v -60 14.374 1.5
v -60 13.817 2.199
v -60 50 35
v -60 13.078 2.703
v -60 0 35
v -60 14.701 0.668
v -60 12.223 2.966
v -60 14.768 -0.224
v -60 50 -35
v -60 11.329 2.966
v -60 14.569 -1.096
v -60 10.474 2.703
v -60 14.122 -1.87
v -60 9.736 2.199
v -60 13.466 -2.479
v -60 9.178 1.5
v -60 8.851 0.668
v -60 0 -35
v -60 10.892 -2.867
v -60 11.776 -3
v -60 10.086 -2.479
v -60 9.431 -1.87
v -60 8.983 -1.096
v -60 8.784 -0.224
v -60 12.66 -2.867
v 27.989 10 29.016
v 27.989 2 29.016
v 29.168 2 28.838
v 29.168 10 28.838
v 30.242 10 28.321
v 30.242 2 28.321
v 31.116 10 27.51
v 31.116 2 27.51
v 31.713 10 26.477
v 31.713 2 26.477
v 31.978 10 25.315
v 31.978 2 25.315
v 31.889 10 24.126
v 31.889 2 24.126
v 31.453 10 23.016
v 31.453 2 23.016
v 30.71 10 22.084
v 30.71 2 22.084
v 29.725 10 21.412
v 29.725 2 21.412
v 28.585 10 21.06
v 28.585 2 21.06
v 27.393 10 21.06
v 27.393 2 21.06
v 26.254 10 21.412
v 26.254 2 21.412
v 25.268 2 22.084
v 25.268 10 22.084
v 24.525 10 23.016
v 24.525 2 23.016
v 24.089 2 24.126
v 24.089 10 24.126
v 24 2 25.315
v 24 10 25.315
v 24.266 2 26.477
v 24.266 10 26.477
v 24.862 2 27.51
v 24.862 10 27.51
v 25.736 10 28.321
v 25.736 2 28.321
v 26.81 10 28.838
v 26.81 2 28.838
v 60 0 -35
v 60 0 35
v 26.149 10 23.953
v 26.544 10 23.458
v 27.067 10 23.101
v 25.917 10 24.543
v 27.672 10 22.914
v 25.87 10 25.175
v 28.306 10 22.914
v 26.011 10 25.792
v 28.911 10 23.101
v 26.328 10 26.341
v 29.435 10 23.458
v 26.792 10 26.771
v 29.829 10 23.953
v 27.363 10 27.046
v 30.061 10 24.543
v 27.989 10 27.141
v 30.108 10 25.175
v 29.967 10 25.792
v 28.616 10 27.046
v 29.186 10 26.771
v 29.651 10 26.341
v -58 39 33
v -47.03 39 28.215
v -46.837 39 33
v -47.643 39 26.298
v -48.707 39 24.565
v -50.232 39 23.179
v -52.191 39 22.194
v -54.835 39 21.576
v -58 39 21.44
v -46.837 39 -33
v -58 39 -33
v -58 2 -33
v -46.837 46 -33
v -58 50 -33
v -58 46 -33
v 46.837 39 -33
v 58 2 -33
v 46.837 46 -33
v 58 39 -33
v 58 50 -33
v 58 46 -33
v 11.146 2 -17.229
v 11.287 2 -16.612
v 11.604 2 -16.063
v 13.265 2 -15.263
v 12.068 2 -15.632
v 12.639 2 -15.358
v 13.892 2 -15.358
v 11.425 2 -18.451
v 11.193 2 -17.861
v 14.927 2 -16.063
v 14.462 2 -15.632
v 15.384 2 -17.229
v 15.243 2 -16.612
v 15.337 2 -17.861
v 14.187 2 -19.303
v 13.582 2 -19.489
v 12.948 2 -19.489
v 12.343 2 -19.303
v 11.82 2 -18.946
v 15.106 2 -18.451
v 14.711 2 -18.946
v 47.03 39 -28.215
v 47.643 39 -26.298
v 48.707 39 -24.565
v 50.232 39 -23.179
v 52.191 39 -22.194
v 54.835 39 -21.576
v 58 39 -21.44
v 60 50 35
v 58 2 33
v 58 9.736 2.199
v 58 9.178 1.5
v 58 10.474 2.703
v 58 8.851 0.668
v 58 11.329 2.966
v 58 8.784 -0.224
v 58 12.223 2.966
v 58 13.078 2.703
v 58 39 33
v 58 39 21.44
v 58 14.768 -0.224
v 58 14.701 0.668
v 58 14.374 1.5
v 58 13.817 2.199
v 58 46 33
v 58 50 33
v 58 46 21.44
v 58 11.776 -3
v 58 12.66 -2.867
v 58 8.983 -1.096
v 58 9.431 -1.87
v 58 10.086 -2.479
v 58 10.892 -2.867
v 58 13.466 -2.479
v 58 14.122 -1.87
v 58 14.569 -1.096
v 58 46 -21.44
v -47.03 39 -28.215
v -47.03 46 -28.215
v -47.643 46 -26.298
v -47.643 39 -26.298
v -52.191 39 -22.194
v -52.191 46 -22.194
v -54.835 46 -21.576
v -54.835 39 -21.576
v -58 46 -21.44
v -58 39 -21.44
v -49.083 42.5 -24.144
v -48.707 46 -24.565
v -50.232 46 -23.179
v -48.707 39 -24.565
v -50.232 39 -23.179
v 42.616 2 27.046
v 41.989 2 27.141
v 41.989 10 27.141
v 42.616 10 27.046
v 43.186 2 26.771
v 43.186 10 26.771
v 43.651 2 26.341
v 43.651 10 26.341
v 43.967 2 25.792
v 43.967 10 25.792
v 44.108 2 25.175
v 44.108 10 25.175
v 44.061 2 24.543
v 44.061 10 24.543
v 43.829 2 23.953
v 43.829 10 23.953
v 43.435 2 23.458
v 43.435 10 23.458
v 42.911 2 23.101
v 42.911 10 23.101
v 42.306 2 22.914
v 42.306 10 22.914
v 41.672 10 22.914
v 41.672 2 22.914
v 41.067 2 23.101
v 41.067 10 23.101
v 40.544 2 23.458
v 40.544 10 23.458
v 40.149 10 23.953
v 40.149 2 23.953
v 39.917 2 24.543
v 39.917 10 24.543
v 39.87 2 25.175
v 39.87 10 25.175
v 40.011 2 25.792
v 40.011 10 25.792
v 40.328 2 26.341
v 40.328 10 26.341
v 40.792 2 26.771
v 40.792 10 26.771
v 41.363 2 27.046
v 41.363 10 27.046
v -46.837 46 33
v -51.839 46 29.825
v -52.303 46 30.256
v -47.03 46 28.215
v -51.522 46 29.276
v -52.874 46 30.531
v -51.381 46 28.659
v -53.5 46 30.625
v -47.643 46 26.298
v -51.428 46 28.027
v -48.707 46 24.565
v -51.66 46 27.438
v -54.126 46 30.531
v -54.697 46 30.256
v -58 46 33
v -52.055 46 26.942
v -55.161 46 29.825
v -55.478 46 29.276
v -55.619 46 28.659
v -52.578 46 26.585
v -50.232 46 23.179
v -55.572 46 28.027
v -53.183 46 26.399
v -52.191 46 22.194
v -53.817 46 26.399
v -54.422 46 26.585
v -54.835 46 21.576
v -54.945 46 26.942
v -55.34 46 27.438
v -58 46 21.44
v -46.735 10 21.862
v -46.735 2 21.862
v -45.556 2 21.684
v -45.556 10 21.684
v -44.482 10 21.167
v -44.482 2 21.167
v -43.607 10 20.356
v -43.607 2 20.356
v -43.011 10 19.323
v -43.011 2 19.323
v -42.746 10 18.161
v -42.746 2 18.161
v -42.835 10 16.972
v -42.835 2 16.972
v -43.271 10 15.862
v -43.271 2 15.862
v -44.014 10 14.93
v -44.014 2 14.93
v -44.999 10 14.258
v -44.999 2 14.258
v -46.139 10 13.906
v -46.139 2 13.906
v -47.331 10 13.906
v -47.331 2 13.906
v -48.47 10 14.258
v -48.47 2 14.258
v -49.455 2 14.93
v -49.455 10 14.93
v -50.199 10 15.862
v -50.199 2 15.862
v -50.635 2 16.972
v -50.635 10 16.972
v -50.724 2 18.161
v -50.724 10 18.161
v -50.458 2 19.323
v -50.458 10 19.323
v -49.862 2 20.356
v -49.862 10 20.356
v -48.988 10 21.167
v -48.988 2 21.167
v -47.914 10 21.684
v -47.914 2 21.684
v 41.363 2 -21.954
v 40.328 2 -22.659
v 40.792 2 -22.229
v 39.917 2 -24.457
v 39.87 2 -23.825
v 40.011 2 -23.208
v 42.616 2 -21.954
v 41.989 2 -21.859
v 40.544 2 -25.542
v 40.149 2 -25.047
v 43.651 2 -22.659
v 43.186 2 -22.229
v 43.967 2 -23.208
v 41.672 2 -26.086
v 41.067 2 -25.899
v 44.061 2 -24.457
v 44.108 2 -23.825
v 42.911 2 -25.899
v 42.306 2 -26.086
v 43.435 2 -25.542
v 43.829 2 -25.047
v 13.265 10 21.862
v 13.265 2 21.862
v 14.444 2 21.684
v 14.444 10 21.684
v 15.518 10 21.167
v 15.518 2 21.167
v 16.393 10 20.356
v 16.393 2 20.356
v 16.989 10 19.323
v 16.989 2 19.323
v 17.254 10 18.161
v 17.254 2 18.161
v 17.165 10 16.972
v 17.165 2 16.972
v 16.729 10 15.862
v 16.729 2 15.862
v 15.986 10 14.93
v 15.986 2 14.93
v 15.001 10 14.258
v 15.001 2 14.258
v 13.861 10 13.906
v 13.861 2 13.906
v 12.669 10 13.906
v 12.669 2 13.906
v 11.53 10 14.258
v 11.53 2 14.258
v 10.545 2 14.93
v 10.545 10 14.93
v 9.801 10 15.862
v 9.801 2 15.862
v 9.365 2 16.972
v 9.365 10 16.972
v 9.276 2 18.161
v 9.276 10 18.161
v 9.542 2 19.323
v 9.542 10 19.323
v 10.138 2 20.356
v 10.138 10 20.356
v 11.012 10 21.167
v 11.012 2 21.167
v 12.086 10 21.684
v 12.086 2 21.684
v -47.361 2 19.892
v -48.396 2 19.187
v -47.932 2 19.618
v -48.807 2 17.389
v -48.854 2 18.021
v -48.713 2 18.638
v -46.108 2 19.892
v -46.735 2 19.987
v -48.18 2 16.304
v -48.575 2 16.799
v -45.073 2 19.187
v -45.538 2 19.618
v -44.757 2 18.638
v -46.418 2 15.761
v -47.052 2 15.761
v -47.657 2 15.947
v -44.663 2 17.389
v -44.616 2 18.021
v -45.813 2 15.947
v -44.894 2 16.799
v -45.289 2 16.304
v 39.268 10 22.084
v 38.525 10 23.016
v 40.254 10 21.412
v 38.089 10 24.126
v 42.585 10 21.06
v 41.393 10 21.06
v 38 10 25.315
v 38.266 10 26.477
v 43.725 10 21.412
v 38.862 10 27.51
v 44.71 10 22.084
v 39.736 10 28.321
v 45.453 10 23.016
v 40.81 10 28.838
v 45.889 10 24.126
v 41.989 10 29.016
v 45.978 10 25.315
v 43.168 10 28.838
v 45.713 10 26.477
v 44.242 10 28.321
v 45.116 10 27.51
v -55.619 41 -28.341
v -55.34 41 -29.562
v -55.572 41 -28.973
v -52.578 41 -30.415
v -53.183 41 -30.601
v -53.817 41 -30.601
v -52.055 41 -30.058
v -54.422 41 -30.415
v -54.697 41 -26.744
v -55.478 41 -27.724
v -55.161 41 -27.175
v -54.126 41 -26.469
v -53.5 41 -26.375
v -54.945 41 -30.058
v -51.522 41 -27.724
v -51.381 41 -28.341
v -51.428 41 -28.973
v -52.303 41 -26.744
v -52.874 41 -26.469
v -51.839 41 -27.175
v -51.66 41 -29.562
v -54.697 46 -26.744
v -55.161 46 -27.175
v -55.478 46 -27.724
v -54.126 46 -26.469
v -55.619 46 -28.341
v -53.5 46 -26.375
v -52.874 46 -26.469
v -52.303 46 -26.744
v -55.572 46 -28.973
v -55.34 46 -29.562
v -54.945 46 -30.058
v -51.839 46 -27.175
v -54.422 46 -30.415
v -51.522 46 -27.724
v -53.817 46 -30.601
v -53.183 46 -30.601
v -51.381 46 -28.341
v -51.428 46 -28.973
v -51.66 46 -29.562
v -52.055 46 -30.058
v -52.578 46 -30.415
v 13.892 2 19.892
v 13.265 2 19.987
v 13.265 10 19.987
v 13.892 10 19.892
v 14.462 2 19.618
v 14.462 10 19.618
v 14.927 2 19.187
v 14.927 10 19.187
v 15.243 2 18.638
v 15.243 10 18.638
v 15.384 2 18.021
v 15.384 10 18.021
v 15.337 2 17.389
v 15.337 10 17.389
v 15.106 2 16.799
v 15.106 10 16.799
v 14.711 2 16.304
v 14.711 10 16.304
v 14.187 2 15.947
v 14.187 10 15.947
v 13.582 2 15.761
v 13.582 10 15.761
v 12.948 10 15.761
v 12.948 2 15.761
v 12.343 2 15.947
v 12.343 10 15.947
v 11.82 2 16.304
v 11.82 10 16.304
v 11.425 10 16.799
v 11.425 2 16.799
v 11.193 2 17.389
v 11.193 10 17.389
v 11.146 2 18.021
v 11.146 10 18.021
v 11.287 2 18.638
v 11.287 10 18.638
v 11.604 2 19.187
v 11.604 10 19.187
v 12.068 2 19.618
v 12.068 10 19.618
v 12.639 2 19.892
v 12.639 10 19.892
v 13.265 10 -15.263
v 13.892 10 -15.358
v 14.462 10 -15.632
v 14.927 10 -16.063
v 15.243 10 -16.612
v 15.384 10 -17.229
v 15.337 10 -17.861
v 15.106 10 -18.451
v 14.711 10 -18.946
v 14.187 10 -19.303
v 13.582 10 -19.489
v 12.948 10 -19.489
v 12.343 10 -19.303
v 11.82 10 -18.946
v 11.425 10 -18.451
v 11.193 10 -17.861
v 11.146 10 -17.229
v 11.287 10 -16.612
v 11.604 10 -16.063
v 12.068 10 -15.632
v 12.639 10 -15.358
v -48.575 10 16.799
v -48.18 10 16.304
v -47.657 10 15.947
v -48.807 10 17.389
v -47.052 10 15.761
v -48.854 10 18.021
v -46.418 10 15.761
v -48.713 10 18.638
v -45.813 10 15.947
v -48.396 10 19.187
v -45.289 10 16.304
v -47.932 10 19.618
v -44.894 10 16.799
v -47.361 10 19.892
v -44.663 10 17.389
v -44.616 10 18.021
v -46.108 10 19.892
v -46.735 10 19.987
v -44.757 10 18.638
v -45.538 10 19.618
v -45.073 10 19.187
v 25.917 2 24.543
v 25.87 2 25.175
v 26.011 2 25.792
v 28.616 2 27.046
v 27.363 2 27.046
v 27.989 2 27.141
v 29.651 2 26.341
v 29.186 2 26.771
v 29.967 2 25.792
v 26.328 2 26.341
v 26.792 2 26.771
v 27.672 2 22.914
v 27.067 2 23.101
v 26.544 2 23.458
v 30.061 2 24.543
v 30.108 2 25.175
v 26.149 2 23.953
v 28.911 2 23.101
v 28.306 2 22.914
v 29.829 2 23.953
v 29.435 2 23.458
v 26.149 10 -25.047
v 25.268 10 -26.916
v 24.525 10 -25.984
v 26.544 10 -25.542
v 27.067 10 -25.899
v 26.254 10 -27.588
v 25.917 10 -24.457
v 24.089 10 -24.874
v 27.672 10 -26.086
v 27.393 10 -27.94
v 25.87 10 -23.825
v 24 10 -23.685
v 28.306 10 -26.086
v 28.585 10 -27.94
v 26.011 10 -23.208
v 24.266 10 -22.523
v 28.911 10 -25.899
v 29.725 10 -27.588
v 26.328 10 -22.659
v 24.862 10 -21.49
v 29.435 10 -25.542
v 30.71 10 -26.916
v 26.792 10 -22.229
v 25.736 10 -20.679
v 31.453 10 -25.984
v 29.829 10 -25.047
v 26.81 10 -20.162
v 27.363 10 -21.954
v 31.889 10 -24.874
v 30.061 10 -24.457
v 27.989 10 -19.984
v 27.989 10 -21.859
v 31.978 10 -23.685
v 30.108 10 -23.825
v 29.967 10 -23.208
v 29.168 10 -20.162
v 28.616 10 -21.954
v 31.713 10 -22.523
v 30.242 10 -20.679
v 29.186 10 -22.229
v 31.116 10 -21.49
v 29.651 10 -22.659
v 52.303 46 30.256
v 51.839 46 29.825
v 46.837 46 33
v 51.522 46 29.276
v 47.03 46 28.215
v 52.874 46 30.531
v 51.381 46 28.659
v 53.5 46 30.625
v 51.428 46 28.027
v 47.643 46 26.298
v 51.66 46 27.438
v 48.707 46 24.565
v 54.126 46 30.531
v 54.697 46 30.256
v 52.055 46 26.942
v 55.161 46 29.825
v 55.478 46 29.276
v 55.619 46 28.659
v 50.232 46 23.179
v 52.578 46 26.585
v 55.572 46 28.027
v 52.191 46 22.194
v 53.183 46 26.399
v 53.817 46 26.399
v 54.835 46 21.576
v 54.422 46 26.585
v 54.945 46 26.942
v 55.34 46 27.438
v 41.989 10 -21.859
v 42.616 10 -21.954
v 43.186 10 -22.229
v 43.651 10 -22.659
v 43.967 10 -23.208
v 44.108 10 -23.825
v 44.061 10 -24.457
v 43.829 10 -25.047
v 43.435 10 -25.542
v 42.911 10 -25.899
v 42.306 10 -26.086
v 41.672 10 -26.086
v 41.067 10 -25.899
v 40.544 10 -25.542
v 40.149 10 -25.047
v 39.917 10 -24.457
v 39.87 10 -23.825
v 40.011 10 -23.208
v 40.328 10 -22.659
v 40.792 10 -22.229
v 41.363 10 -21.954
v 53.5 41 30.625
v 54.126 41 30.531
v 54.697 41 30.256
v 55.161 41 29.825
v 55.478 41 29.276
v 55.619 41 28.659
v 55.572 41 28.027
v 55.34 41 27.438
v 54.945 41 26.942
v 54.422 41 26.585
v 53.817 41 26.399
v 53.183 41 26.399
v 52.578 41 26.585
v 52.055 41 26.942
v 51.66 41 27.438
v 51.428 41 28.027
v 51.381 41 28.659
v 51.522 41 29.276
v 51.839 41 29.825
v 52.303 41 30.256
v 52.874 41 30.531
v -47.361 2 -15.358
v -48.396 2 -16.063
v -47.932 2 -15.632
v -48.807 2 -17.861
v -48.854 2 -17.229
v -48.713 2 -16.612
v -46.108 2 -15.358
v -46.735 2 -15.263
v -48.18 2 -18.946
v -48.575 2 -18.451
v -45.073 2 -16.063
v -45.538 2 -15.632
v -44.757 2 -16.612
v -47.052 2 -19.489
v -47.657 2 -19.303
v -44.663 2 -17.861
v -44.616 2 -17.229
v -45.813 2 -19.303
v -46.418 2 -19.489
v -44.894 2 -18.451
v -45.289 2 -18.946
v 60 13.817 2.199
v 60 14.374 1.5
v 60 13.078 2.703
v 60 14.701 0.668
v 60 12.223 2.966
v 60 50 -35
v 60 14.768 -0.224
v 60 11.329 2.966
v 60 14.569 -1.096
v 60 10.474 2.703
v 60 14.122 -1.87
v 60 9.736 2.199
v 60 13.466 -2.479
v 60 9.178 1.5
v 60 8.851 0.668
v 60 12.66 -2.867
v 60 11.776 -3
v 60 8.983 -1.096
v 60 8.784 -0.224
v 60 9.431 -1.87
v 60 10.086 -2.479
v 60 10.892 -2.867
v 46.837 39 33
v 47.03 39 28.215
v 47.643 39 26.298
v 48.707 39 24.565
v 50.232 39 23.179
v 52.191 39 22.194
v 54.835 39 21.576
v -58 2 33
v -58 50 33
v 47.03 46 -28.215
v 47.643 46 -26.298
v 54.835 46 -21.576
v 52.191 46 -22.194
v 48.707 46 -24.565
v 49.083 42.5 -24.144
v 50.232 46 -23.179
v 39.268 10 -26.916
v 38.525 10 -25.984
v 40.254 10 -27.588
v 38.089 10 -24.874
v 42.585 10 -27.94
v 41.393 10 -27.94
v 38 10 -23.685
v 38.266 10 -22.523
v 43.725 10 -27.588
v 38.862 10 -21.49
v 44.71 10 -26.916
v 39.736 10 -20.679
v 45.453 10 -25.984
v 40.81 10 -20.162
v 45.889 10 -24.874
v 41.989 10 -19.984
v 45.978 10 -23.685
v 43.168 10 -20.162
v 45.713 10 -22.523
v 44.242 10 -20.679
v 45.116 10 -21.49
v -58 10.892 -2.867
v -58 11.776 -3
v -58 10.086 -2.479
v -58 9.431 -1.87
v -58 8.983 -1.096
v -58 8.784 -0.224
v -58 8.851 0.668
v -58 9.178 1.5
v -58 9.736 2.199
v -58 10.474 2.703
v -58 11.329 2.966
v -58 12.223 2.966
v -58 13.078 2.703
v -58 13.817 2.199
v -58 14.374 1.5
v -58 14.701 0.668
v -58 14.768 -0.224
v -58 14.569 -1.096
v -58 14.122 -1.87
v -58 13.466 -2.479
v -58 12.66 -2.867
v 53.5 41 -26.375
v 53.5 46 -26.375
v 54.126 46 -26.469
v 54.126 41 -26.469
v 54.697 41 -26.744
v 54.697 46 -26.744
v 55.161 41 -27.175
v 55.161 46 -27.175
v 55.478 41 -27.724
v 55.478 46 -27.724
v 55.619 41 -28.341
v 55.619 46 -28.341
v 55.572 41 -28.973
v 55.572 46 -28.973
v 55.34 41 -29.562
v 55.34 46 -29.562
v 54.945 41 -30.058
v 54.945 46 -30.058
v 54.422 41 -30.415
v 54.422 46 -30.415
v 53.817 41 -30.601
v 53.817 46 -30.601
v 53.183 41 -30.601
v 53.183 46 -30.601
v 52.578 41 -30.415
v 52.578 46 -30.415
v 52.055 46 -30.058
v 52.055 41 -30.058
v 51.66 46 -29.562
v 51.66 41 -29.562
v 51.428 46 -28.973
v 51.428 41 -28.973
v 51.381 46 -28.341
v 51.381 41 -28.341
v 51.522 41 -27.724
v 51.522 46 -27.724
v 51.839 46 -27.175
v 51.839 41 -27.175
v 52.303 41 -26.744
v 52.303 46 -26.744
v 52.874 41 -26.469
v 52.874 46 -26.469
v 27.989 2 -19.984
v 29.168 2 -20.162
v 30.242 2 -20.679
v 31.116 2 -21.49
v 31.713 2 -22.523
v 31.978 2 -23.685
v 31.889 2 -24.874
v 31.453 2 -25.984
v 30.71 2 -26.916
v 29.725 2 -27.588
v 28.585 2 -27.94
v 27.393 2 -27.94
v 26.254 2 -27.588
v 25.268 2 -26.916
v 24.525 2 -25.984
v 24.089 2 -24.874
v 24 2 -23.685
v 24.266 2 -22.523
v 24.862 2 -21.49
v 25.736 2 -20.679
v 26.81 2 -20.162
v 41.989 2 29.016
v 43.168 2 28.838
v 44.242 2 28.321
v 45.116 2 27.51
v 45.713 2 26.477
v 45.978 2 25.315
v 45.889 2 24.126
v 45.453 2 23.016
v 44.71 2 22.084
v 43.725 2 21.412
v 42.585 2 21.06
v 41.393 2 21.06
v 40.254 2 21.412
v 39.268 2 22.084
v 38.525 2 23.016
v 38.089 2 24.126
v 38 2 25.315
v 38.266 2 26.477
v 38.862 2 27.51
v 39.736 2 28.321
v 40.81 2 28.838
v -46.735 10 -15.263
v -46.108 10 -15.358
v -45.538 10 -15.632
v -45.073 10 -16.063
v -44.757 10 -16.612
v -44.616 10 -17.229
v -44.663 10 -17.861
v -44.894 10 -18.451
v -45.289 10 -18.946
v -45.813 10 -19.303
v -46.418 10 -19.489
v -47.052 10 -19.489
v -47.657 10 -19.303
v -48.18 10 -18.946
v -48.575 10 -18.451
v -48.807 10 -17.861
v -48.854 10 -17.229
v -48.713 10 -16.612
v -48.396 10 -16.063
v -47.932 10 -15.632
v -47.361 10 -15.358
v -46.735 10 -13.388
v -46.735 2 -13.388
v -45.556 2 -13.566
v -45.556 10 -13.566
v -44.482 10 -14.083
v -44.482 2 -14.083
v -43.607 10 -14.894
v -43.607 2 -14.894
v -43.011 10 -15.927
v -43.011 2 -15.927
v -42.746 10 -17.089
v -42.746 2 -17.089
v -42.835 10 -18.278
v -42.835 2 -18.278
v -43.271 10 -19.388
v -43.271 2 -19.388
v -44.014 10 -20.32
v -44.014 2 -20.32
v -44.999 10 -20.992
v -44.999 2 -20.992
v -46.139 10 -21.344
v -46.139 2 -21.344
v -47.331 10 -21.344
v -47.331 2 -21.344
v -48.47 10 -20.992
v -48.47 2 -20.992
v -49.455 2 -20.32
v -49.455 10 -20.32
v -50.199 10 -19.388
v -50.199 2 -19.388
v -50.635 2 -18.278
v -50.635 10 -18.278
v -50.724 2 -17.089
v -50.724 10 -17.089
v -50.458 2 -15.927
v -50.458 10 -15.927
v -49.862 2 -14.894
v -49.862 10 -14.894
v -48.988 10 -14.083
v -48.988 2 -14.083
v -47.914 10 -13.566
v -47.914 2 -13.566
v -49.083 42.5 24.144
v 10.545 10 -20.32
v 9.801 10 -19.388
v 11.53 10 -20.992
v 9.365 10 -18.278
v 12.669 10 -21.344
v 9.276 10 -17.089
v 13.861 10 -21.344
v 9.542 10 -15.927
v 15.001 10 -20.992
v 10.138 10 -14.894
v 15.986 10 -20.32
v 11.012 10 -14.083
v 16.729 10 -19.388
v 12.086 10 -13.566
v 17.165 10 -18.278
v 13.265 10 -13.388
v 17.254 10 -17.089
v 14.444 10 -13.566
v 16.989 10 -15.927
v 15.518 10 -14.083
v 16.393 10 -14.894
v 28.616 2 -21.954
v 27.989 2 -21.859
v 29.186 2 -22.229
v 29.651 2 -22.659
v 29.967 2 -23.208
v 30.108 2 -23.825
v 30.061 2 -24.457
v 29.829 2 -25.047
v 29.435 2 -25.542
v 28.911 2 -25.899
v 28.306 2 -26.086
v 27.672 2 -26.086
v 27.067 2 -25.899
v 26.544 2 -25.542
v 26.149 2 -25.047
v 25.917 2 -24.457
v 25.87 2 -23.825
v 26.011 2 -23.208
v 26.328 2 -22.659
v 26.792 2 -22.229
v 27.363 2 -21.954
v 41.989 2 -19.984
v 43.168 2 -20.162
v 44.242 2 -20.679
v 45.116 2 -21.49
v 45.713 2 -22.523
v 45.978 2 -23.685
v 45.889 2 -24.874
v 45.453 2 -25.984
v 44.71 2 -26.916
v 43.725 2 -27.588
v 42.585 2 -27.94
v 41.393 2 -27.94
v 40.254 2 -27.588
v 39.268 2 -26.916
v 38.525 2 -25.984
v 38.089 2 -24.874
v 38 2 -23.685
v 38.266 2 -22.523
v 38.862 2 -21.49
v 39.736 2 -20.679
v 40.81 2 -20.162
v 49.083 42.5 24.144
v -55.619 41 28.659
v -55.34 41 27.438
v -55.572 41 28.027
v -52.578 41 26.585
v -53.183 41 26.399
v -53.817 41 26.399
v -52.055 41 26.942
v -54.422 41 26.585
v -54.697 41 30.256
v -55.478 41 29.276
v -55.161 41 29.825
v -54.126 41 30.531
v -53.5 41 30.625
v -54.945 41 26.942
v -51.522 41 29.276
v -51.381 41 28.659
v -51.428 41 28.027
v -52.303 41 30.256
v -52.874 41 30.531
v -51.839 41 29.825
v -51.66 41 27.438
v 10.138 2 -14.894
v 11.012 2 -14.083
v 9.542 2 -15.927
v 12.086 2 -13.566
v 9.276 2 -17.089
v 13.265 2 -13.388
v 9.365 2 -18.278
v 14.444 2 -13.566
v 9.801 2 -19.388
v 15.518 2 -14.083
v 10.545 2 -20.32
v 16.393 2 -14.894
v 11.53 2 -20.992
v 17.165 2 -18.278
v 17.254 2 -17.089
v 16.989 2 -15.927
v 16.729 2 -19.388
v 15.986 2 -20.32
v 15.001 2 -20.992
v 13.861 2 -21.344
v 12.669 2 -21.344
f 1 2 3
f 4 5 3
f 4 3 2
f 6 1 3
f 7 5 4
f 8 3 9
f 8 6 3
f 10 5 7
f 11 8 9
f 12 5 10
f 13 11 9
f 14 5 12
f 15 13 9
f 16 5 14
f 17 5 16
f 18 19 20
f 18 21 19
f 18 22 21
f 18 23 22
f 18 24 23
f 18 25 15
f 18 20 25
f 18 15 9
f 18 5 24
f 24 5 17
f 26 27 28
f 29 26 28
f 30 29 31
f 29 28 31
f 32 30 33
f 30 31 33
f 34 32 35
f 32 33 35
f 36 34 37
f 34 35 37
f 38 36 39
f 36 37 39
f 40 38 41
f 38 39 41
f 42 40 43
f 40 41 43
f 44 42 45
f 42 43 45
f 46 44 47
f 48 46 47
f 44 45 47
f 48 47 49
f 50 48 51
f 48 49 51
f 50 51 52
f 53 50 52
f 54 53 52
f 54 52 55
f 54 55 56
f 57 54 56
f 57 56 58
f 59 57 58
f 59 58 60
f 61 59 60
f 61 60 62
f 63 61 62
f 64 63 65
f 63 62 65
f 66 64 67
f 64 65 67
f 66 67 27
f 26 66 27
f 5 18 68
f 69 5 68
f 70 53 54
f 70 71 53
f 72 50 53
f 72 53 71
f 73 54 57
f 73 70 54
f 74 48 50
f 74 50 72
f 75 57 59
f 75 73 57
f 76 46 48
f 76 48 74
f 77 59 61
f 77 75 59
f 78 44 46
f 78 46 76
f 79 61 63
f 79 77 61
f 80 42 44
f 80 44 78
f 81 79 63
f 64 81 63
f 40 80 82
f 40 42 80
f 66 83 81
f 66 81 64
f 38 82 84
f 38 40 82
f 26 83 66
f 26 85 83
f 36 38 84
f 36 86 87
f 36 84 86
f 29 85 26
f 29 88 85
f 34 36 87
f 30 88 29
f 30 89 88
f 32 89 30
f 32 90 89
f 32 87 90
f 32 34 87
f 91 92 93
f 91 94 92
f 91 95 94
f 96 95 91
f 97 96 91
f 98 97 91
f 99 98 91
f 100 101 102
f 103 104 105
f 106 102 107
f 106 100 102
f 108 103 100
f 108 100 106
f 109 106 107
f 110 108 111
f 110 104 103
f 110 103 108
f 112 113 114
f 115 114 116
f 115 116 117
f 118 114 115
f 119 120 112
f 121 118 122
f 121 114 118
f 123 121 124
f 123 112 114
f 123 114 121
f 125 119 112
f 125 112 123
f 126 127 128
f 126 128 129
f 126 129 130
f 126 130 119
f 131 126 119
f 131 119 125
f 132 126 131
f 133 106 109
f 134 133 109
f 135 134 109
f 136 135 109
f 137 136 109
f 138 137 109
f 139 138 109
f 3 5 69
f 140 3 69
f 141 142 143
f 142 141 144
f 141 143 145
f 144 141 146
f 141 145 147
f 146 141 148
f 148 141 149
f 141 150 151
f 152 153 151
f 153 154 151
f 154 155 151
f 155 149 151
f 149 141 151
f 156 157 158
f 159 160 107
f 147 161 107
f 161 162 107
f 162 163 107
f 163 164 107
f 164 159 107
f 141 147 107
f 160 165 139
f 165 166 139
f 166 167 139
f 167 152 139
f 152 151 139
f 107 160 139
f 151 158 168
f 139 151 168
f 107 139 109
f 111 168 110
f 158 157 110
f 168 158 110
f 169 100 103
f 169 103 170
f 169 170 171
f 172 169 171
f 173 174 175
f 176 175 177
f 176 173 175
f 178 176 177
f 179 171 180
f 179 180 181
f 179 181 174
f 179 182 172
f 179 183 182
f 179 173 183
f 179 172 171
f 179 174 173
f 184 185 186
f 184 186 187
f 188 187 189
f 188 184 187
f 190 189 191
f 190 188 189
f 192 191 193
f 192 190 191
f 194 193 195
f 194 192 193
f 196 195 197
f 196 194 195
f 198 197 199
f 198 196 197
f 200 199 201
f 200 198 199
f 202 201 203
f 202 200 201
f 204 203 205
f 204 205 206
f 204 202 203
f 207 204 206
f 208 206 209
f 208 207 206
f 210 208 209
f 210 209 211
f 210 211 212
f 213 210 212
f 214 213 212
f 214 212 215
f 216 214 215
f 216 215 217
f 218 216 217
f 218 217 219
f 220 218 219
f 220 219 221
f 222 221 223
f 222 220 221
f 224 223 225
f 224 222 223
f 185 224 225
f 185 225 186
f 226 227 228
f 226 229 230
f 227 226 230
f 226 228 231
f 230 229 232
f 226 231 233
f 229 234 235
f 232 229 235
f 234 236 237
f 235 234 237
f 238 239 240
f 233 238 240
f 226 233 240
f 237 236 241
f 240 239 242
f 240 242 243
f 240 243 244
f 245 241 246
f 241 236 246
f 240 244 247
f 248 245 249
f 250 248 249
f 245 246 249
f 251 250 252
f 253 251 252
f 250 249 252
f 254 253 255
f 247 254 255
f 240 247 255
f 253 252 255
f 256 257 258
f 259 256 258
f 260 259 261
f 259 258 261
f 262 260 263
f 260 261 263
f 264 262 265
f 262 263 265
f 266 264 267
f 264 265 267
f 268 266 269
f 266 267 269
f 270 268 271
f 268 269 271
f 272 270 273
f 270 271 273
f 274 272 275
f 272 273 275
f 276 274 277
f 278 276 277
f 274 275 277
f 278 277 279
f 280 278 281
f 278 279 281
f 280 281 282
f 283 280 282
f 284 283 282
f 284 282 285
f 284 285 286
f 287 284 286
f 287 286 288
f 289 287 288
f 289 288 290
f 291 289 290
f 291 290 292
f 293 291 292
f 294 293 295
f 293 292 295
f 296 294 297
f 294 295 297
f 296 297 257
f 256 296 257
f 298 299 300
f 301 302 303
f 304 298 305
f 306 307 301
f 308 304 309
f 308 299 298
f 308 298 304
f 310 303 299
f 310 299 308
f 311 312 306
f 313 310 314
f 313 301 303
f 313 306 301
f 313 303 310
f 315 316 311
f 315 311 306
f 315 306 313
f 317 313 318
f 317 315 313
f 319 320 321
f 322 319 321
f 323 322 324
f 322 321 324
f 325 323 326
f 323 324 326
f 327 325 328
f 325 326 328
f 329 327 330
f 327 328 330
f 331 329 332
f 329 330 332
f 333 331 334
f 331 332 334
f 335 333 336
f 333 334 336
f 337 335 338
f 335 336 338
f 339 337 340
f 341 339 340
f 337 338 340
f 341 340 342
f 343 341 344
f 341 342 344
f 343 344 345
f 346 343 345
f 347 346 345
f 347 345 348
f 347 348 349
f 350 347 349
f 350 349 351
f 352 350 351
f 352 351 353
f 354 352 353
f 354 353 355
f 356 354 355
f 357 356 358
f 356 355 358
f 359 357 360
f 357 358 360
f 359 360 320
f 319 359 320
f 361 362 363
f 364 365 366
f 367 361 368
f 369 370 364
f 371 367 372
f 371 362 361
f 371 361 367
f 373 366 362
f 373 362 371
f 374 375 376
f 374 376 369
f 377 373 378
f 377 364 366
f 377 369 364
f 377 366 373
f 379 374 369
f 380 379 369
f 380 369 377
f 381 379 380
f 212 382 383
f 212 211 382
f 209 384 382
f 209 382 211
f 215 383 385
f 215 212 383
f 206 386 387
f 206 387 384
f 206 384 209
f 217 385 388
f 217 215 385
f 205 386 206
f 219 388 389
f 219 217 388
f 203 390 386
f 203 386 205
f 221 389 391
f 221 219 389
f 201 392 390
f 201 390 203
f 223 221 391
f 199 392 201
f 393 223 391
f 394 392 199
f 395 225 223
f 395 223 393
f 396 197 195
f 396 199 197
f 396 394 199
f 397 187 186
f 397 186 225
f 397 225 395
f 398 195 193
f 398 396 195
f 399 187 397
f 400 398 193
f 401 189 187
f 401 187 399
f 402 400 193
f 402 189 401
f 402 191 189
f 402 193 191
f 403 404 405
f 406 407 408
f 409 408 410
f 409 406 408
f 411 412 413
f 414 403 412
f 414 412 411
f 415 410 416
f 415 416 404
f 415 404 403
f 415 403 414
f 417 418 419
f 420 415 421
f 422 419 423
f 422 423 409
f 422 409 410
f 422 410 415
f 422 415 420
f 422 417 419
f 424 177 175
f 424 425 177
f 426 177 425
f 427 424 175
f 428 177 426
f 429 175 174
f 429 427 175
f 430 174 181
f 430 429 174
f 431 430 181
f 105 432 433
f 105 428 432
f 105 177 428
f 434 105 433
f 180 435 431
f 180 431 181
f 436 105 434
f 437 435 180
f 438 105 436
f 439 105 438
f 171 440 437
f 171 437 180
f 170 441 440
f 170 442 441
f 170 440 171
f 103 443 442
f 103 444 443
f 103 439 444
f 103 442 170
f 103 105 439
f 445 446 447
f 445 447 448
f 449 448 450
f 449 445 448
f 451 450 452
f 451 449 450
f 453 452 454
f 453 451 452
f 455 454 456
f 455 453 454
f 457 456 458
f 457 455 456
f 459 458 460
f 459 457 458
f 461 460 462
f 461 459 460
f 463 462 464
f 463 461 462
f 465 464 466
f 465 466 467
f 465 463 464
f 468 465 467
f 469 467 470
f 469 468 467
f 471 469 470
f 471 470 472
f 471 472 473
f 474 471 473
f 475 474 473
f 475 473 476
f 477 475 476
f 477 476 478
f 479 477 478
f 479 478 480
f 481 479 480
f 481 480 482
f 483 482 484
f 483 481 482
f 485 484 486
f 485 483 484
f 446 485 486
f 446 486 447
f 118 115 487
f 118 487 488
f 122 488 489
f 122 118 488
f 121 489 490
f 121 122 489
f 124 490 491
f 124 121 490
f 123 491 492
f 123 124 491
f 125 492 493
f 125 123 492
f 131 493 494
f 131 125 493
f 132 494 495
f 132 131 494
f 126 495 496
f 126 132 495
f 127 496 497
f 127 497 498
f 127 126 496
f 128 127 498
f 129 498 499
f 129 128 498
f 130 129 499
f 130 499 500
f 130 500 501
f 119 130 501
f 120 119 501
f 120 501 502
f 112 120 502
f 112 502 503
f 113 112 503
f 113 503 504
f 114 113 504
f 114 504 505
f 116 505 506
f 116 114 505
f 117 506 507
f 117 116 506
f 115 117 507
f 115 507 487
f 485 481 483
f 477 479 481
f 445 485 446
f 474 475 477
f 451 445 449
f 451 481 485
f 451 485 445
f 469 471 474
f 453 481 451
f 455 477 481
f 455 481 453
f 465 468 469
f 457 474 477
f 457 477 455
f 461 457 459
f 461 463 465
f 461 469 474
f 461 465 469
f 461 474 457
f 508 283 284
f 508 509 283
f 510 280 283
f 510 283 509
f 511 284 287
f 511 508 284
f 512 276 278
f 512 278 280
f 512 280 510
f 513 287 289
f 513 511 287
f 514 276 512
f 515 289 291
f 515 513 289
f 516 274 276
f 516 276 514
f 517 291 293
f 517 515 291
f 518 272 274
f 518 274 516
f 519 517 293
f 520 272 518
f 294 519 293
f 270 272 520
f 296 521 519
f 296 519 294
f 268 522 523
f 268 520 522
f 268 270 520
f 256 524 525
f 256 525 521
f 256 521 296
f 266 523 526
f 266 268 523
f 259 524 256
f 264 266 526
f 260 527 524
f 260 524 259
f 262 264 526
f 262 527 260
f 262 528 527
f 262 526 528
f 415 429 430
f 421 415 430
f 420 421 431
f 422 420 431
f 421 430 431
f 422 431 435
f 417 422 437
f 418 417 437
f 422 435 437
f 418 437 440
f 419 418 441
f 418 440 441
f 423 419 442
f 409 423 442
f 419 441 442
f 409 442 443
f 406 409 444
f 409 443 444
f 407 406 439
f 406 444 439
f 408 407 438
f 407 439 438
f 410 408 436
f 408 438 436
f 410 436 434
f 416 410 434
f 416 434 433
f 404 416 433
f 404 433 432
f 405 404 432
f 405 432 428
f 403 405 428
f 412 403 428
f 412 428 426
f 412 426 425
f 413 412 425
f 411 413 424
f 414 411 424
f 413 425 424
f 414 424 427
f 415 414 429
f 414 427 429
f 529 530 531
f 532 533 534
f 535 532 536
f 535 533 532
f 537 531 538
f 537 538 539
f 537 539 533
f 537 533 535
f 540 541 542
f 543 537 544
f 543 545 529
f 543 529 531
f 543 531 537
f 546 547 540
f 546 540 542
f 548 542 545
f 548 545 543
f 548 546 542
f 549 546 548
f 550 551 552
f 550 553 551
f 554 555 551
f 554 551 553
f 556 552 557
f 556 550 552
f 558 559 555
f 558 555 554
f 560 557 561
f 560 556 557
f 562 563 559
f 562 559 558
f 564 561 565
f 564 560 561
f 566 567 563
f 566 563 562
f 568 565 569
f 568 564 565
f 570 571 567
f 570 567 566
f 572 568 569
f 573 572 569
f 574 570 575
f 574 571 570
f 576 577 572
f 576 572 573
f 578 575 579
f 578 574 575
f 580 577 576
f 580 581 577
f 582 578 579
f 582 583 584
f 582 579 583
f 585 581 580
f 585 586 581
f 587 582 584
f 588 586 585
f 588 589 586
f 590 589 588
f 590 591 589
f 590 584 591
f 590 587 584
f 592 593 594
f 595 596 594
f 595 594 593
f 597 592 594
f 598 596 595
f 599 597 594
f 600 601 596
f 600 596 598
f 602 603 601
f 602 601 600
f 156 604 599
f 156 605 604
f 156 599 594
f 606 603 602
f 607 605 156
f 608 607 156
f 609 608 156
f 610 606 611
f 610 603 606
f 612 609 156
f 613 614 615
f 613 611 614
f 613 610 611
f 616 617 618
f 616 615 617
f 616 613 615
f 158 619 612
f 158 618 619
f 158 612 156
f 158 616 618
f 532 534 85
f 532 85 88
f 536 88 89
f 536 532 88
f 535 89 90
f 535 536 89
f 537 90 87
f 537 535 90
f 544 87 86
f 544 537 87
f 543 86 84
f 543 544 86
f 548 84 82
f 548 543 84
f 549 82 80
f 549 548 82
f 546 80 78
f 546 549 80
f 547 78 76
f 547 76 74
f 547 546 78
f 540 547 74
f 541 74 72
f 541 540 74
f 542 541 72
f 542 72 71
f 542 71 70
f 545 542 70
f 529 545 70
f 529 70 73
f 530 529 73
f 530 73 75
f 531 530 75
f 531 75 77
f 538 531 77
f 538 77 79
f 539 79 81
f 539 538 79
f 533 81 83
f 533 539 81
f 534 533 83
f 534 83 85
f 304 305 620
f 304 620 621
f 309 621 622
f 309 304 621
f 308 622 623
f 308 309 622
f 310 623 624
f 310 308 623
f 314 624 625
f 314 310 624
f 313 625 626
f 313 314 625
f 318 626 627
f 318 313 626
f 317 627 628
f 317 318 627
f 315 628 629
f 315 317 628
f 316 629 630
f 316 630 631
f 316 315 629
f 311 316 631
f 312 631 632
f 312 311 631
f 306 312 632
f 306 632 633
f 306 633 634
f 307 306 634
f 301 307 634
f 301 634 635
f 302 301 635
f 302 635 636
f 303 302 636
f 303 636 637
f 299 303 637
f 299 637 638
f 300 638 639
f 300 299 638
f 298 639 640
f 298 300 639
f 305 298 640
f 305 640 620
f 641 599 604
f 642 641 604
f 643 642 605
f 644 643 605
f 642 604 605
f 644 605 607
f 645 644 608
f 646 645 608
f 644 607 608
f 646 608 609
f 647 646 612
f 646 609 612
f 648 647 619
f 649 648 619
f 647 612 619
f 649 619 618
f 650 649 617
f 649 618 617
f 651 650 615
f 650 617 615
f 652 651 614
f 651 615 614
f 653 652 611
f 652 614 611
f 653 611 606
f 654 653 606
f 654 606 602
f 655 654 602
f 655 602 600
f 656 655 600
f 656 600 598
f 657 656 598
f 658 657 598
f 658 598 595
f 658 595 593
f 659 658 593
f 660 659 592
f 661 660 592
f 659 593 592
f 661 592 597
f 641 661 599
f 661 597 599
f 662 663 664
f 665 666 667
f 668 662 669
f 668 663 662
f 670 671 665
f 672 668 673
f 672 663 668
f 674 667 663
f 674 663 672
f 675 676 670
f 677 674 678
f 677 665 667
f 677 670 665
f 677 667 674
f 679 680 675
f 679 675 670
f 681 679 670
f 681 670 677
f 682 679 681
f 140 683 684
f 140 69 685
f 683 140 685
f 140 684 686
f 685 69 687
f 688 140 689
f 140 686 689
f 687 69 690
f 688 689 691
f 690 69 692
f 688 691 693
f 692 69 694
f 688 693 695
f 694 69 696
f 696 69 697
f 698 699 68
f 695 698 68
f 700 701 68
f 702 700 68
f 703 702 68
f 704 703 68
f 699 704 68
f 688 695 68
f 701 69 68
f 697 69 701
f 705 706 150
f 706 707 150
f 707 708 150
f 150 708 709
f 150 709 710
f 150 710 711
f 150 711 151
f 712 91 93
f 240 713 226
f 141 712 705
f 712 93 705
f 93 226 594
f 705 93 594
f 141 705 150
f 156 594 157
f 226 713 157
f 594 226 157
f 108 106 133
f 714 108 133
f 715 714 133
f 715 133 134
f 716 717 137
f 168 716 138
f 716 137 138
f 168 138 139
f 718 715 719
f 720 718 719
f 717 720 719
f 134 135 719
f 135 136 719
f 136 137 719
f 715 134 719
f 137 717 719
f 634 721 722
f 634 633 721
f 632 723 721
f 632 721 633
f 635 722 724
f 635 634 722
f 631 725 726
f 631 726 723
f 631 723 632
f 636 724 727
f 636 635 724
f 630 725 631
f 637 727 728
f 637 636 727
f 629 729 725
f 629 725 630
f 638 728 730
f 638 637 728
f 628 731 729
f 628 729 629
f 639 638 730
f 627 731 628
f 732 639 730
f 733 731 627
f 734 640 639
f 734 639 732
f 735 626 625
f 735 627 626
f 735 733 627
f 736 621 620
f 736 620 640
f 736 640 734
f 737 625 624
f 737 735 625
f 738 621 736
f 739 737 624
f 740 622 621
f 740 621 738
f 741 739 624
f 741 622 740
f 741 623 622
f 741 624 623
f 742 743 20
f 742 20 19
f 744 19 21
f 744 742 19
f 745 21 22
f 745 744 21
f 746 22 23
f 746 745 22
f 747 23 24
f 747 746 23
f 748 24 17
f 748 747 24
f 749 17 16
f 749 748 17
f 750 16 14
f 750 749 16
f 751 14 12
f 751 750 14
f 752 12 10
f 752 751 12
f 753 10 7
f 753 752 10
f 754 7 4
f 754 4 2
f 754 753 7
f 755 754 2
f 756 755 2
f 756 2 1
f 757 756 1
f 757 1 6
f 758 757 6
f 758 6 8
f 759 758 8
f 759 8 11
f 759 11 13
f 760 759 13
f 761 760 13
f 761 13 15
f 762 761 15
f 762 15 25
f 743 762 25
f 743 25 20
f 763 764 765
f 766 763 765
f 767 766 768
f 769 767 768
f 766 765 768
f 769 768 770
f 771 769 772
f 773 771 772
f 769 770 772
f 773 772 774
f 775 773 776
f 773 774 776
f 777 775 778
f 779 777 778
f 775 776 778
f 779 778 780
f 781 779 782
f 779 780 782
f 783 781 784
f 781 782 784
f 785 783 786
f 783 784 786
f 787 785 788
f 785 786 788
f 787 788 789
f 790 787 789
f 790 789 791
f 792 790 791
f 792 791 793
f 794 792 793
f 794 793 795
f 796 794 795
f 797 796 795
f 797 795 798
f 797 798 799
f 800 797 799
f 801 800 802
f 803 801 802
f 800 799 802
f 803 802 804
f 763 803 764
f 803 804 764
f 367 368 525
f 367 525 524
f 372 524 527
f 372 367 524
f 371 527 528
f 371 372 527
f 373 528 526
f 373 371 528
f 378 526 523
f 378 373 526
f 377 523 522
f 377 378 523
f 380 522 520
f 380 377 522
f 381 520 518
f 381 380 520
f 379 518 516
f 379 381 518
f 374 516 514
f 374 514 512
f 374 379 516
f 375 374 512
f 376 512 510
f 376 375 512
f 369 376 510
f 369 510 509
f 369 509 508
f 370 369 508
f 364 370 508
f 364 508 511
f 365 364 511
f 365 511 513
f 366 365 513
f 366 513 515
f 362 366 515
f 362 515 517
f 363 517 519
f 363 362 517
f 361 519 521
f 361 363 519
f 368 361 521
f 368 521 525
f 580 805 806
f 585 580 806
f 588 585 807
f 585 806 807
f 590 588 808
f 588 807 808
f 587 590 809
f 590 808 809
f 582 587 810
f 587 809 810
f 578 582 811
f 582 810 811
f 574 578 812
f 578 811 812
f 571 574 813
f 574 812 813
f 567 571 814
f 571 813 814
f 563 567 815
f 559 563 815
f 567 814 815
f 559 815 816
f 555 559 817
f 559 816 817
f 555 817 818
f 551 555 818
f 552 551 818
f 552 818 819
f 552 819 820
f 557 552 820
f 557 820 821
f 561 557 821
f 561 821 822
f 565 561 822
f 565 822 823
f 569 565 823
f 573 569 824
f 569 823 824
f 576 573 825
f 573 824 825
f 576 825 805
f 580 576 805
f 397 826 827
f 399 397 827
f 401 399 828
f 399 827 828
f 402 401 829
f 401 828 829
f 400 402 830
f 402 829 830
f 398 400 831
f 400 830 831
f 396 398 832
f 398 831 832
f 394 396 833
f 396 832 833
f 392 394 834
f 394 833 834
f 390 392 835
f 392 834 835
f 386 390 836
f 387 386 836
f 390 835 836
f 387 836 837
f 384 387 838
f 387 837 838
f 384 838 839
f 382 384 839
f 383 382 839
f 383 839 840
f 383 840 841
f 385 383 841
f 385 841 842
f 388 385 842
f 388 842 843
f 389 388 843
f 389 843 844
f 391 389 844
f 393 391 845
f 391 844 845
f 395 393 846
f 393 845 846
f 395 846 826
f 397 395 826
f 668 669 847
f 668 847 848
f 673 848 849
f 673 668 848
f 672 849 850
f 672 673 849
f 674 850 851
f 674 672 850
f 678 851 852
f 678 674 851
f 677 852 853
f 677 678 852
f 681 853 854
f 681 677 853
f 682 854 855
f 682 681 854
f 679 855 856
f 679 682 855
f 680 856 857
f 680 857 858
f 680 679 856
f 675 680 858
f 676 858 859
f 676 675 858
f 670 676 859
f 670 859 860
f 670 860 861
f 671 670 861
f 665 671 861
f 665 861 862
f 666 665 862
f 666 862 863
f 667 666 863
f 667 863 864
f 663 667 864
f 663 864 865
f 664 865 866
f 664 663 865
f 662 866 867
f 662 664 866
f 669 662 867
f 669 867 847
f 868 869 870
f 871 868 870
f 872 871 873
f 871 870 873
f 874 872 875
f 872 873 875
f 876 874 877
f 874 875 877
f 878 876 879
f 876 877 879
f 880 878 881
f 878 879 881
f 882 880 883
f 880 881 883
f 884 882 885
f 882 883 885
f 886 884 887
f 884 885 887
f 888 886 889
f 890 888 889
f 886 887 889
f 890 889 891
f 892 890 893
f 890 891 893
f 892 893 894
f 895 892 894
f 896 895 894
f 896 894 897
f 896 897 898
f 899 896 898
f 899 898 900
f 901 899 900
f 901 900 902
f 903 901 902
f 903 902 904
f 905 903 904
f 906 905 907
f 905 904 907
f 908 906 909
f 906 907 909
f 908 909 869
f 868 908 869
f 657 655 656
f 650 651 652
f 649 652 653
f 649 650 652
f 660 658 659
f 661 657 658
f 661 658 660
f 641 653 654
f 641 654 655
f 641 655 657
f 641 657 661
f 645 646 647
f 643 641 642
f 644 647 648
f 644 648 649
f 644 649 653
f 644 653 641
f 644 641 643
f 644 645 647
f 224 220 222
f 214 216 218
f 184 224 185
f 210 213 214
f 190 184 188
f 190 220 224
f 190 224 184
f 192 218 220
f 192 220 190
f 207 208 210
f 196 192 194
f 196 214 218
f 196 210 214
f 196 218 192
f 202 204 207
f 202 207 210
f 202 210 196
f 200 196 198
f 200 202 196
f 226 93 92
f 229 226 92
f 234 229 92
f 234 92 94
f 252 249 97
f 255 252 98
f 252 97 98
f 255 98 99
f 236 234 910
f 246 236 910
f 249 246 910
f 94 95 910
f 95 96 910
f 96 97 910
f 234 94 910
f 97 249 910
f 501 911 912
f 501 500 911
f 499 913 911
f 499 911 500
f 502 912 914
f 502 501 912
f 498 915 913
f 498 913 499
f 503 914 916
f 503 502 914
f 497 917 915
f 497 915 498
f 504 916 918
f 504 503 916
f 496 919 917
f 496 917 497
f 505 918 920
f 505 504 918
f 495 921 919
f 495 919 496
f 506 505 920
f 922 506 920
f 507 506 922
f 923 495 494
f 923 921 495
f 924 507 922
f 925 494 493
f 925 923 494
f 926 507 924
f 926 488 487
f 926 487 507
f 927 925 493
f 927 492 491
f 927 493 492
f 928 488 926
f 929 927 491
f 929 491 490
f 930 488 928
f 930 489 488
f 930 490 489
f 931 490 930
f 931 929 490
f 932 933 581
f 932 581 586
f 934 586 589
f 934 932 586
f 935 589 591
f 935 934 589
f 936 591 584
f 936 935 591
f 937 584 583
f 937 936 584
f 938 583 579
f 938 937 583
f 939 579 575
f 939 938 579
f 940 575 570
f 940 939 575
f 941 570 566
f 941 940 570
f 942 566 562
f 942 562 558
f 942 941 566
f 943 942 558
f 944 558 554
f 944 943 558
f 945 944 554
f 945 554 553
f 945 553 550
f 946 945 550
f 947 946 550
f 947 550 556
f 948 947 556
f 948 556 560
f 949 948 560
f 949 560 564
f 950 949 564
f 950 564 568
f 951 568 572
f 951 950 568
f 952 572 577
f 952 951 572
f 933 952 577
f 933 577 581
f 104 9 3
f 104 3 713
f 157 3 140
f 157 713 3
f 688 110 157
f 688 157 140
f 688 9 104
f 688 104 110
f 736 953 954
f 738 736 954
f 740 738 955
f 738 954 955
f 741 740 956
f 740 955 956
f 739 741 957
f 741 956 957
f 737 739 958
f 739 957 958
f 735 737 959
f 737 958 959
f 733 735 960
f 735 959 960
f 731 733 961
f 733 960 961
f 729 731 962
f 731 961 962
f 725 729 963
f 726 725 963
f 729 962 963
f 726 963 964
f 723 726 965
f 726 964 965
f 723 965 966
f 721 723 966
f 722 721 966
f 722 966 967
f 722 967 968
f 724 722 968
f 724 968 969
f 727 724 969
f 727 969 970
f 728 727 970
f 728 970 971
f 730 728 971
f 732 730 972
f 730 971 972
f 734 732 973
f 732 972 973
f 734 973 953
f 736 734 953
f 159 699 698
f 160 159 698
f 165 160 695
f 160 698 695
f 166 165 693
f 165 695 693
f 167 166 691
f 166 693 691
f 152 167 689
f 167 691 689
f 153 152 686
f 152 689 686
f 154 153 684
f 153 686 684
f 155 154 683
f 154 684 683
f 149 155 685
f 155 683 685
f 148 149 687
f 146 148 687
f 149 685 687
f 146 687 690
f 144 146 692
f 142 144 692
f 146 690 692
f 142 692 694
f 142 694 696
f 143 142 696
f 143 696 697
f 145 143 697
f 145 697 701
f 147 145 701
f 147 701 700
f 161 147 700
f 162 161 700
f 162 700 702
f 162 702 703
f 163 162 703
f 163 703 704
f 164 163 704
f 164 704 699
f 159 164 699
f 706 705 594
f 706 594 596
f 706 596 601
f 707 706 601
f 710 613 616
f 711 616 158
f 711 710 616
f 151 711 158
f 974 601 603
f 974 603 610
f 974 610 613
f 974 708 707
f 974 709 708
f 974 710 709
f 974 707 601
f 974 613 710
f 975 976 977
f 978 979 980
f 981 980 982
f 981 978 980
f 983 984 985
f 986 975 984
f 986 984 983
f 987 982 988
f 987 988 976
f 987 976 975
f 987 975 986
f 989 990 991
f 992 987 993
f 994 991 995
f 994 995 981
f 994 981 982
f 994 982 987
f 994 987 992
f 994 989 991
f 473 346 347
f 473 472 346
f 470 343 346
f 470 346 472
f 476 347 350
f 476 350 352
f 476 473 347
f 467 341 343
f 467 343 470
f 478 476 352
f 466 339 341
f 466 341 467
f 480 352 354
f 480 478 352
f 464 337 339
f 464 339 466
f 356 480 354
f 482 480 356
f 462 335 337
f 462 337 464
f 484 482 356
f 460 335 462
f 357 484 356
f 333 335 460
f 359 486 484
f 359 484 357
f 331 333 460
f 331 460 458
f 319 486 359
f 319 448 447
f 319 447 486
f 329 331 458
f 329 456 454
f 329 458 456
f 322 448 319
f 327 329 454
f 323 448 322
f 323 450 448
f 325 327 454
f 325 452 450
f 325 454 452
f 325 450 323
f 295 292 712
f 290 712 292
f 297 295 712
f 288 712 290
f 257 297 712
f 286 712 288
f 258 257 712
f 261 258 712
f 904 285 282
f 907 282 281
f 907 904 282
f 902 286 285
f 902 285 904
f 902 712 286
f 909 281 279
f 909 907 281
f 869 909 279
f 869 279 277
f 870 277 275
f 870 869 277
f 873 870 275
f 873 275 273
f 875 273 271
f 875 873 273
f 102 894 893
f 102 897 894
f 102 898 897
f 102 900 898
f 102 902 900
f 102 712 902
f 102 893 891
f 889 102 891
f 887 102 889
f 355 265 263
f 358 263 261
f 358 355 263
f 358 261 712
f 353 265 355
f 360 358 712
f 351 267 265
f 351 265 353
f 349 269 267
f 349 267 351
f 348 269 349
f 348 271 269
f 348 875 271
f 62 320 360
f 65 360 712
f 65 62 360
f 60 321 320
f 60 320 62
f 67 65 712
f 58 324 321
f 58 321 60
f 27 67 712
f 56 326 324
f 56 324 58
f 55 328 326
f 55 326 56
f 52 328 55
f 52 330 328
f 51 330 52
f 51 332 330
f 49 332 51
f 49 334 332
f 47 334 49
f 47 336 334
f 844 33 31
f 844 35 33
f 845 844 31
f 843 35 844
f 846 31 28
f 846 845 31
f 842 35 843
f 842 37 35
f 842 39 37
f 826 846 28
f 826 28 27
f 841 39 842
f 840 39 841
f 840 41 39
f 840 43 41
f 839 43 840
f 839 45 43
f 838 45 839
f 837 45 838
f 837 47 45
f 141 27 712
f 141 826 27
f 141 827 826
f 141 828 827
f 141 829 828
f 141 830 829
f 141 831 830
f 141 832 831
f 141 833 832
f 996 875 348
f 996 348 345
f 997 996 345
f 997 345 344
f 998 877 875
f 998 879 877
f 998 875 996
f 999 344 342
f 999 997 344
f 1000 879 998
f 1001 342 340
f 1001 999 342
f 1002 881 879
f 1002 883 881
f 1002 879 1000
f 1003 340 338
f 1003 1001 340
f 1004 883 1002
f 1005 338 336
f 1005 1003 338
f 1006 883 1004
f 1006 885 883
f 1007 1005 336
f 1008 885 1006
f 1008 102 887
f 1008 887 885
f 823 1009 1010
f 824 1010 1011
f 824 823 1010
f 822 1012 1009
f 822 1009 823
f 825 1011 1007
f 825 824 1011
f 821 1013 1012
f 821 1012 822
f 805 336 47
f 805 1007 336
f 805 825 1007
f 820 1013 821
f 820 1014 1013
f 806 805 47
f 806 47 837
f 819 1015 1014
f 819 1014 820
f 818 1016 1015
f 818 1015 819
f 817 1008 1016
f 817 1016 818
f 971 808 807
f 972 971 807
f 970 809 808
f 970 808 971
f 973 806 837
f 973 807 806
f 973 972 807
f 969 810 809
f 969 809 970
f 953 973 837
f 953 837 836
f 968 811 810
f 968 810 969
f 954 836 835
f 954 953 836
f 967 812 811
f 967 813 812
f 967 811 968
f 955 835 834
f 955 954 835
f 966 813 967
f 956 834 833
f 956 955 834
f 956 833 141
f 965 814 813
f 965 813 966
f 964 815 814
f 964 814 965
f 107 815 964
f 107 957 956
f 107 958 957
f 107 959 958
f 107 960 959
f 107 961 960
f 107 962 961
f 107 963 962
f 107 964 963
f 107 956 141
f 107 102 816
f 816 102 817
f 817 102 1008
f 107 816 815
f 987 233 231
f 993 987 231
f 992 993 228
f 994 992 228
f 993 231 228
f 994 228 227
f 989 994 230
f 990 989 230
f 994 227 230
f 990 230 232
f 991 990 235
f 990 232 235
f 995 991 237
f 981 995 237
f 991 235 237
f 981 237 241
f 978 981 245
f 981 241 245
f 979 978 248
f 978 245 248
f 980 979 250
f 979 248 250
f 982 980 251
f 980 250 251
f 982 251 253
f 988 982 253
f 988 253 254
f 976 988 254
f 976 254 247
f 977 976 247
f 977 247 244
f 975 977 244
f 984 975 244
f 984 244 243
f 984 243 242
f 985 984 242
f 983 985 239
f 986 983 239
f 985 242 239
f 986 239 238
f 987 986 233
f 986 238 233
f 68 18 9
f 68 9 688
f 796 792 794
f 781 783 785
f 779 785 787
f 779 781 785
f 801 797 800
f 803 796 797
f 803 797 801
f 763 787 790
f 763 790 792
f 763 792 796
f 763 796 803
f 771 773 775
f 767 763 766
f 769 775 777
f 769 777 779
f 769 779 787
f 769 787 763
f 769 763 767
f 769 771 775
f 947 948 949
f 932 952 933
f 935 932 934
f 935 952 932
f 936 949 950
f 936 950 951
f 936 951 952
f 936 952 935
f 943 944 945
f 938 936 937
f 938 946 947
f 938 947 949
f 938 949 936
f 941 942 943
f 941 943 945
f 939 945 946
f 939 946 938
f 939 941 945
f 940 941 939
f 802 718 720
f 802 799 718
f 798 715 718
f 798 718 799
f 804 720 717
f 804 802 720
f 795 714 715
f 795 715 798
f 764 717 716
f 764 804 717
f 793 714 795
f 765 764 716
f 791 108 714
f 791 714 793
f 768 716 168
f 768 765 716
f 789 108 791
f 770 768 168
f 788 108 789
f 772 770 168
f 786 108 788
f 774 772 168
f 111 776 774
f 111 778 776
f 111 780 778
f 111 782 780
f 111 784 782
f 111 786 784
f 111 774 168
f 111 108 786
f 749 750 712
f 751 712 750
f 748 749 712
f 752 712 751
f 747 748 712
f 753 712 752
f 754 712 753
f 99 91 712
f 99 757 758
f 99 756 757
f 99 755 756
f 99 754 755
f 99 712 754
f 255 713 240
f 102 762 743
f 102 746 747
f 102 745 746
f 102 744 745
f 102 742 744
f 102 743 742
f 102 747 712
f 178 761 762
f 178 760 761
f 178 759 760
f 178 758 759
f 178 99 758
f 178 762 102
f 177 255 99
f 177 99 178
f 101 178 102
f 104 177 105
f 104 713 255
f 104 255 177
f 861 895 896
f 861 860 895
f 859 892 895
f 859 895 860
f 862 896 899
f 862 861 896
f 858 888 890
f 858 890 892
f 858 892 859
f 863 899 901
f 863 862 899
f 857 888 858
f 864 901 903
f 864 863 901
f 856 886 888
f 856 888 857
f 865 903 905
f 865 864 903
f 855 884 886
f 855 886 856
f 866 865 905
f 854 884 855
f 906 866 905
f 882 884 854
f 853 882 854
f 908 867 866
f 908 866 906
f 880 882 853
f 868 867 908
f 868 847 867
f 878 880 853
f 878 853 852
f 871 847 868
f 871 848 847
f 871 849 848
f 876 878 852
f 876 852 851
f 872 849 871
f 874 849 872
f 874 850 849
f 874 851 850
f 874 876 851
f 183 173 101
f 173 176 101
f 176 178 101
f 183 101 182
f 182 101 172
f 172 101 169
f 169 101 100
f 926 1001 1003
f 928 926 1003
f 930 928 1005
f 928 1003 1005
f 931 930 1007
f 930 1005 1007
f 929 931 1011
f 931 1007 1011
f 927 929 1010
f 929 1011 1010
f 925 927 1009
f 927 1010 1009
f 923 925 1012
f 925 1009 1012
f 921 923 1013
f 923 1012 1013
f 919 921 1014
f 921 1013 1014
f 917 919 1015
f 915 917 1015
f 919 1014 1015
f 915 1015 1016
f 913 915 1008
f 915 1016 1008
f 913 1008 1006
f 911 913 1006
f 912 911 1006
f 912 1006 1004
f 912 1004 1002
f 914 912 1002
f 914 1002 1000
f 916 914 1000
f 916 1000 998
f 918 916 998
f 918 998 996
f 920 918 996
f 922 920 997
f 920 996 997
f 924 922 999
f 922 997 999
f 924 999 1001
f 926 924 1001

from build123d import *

# Parameters (mm, degrees)
SKETCH1_W           = 120
SKETCH1_H           = 70
BOSS_EXTRUDE1_DEPTH = 50
SKETCH4_W           = 116
SKETCH4_H           = 66
CUT_EXTRUDE1_DEPTH  = 48
SKETCH7_R           = 4
SKETCH7_R_2         = 2.125
BOSS_EXTRUDE3_DEPTH = 8
SKETCH9_R           = 3
CUT_EXTRUDE2_DEPTH  = 3
CUT_EXTRUDE3_START  = -3
SKETCH10_R          = 3
CUT_EXTRUDE3_DEPTH  = 3
BOSS_EXTRUDE4_DEPTH = 7
SKETCH13_R          = 2.125
CUT_EXTRUDE4_DEPTH  = 5


with BuildPart() as part:
    # Sketch1 → Boss-Extrude1 (new body)
    with BuildSketch(Plane(origin=(0, 0, 0), x_dir=(1, 0, 0), z_dir=(0, 1, 0))):
        Rectangle(SKETCH1_W, SKETCH1_H)
    extrude(amount=BOSS_EXTRUDE1_DEPTH)

    # Sketch4 → Cut-Extrude1 (cut)
    with BuildSketch(Plane(origin=(0, 50, 0), x_dir=(1, 0, 0), z_dir=(0, 1, 0))):
        Rectangle(SKETCH4_W, SKETCH4_H)
    extrude(amount=-CUT_EXTRUDE1_DEPTH, mode=Mode.SUBTRACT)

    # Sketch7 → Boss-Extrude3 (add)
    # profile 1 of 8: a face of its own
    with BuildSketch(Plane(origin=(0, 2, 0), x_dir=(1, 0, 0), z_dir=(0, 1, 0))):
        with Locations(Location((41.989163704, 23.984280939, 0), (0, 0, 270))):
            Circle(SKETCH7_R)
        with Locations(Location((41.989163704, 23.984280939, 0), (0, 0, 270))):
            Circle(SKETCH7_R_2, mode=Mode.SUBTRACT)
    # profile 2 of 8: a face of its own
    with BuildSketch(Plane(origin=(0, 2, 0), x_dir=(1, 0, 0), z_dir=(0, 1, 0))):
        with Locations(Location((27.989163704, 23.984280939, 0), (0, 0, 270))):
            Circle(SKETCH7_R)
        with Locations(Location((27.989163704, 23.984280939, 0), (0, 0, 270))):
            Circle(SKETCH7_R_2, mode=Mode.SUBTRACT)
    # profile 3 of 8: a face of its own
    with BuildSketch(Plane(origin=(0, 2, 0), x_dir=(1, 0, 0), z_dir=(0, 1, 0))):
        with Locations(Location((27.989163704, -25.015719061, 0), (0, 0, 270))):
            Circle(SKETCH7_R)
        with Locations(Location((27.989163704, -25.015719061, 0), (0, 0, 270))):
            Circle(SKETCH7_R_2, mode=Mode.SUBTRACT)
    # profile 4 of 8: a face of its own
    with BuildSketch(Plane(origin=(0, 2, 0), x_dir=(1, 0, 0), z_dir=(0, 1, 0))):
        with Locations(Location((41.989163704, -25.015719061, 0), (0, 0, 270))):
            Circle(SKETCH7_R)
        with Locations(Location((41.989163704, -25.015719061, 0), (0, 0, 270))):
            Circle(SKETCH7_R_2, mode=Mode.SUBTRACT)
    # profile 5 of 8: a face of its own
    with BuildSketch(Plane(origin=(0, 2, 0), x_dir=(1, 0, 0), z_dir=(0, 1, 0))):
        with Locations(Location((13.265207025, -17.861812849, 0), (0, 0, 270))):
            Circle(SKETCH7_R)
        with Locations(Location((13.265207025, -17.861812849, 0), (0, 0, 270))):
            Circle(SKETCH7_R_2, mode=Mode.SUBTRACT)
    # profile 6 of 8: a face of its own
    with BuildSketch(Plane(origin=(0, 2, 0), x_dir=(1, 0, 0), z_dir=(0, 1, 0))):
        with Locations(Location((13.265207025, 17.388187151, 0), (0, 0, 270))):
            Circle(SKETCH7_R)
        with Locations(Location((13.265207025, 17.388187151, 0), (0, 0, 270))):
            Circle(SKETCH7_R_2, mode=Mode.SUBTRACT)
    # profile 7 of 8: a face of its own
    with BuildSketch(Plane(origin=(0, 2, 0), x_dir=(1, 0, 0), z_dir=(0, 1, 0))):
        with Locations(Location((-46.734792975, 17.388187151, 0), (0, 0, 270))):
            Circle(SKETCH7_R)
        with Locations(Location((-46.734792975, 17.388187151, 0), (0, 0, 270))):
            Circle(SKETCH7_R_2, mode=Mode.SUBTRACT)
    # profile 8 of 8: a face of its own
    with BuildSketch(Plane(origin=(0, 2, 0), x_dir=(1, 0, 0), z_dir=(0, 1, 0))):
        with Locations(Location((-46.734792975, -17.861812849, 0), (0, 0, 270))):
            Circle(SKETCH7_R)
        with Locations(Location((-46.734792975, -17.861812849, 0), (0, 0, 270))):
            Circle(SKETCH7_R_2, mode=Mode.SUBTRACT)
    extrude(amount=BOSS_EXTRUDE3_DEPTH)

    # Sketch9 → Cut-Extrude2 (cut)
    with BuildSketch(Plane(origin=(60, 0, 0), x_dir=(0, 0, -1), z_dir=(1, 0, 0))):
        with Locations((0, 11.776029547)):
            Circle(SKETCH9_R)
    extrude(amount=-CUT_EXTRUDE2_DEPTH, mode=Mode.SUBTRACT)

    # Sketch10 → Cut-Extrude3 (cut)
    with BuildSketch(Plane.ZY.offset(60).offset(CUT_EXTRUDE3_START)):
        with Locations(Location((0, 11.776029547, 0), (0, 0, 180))):
            Circle(SKETCH10_R)
    extrude(amount=CUT_EXTRUDE3_DEPTH, mode=Mode.SUBTRACT)

    # Sketch12 → Boss-Extrude4 (add)
    with BuildSketch(Plane(origin=(0, 39, 0), x_dir=(1, 0, 0), z_dir=(0, 1, 0))):
        with BuildLine():
            Line((-46.836696193, -33), (-58, -33))
            Line((-58, -33), (-58, -21.439980772))
            add(Edge.make_bspline(
                [(-46.836696193, -33), (-45.747371945, -21.068063371), (-58, -21.439980772)],
                knots=[0, 0, 0, 1, 1, 1], degree=2))
        make_face()
        with BuildLine():
            Line((46.836696193, -33), (58, -33))
            Line((58, -33), (58, -21.439980772))
            add(Edge.make_bspline(
                [(46.836696193, -33), (45.747371945, -21.068063371), (58, -21.439980772)],
                knots=[0, 0, 0, 1, 1, 1], degree=2))
        make_face()
        with BuildLine():
            Line((58, 21.439980772), (58, 33))
            Line((58, 33), (46.836696193, 33))
            add(Edge.make_bspline(
                [(46.836696193, 33), (45.747371945, 21.068063371), (58, 21.439980772)],
                knots=[0, 0, 0, 1, 1, 1], degree=2))
        make_face()
        with BuildLine():
            Line((-46.836696193, 33), (-58, 33))
            Line((-58, 33), (-58, 21.439980772))
            add(Edge.make_bspline(
                [(-46.836696193, 33), (-45.747371945, 21.068063371), (-58, 21.439980772)],
                knots=[0, 0, 0, 1, 1, 1], degree=2))
        make_face()
    extrude(amount=BOSS_EXTRUDE4_DEPTH)

    # Sketch13 → Cut-Extrude4 (cut)
    with BuildSketch(Plane(origin=(0, 46, 0), x_dir=(1, 0, 0), z_dir=(0, 1, 0))):
        with Locations(Location((-53.5, -28.5, 0), (0, 0, 270))):
            Circle(SKETCH13_R)
        with Locations(Location((-53.5, 28.5, 0), (0, 0, 270))):
            Circle(SKETCH13_R)
        with Locations(Location((53.5, -28.5, 0), (0, 0, 270))):
            Circle(SKETCH13_R)
        with Locations(Location((53.5, 28.5, 0), (0, 0, 270))):
            Circle(SKETCH13_R)
    extrude(amount=-CUT_EXTRUDE4_DEPTH, mode=Mode.SUBTRACT)


solid = part.part
